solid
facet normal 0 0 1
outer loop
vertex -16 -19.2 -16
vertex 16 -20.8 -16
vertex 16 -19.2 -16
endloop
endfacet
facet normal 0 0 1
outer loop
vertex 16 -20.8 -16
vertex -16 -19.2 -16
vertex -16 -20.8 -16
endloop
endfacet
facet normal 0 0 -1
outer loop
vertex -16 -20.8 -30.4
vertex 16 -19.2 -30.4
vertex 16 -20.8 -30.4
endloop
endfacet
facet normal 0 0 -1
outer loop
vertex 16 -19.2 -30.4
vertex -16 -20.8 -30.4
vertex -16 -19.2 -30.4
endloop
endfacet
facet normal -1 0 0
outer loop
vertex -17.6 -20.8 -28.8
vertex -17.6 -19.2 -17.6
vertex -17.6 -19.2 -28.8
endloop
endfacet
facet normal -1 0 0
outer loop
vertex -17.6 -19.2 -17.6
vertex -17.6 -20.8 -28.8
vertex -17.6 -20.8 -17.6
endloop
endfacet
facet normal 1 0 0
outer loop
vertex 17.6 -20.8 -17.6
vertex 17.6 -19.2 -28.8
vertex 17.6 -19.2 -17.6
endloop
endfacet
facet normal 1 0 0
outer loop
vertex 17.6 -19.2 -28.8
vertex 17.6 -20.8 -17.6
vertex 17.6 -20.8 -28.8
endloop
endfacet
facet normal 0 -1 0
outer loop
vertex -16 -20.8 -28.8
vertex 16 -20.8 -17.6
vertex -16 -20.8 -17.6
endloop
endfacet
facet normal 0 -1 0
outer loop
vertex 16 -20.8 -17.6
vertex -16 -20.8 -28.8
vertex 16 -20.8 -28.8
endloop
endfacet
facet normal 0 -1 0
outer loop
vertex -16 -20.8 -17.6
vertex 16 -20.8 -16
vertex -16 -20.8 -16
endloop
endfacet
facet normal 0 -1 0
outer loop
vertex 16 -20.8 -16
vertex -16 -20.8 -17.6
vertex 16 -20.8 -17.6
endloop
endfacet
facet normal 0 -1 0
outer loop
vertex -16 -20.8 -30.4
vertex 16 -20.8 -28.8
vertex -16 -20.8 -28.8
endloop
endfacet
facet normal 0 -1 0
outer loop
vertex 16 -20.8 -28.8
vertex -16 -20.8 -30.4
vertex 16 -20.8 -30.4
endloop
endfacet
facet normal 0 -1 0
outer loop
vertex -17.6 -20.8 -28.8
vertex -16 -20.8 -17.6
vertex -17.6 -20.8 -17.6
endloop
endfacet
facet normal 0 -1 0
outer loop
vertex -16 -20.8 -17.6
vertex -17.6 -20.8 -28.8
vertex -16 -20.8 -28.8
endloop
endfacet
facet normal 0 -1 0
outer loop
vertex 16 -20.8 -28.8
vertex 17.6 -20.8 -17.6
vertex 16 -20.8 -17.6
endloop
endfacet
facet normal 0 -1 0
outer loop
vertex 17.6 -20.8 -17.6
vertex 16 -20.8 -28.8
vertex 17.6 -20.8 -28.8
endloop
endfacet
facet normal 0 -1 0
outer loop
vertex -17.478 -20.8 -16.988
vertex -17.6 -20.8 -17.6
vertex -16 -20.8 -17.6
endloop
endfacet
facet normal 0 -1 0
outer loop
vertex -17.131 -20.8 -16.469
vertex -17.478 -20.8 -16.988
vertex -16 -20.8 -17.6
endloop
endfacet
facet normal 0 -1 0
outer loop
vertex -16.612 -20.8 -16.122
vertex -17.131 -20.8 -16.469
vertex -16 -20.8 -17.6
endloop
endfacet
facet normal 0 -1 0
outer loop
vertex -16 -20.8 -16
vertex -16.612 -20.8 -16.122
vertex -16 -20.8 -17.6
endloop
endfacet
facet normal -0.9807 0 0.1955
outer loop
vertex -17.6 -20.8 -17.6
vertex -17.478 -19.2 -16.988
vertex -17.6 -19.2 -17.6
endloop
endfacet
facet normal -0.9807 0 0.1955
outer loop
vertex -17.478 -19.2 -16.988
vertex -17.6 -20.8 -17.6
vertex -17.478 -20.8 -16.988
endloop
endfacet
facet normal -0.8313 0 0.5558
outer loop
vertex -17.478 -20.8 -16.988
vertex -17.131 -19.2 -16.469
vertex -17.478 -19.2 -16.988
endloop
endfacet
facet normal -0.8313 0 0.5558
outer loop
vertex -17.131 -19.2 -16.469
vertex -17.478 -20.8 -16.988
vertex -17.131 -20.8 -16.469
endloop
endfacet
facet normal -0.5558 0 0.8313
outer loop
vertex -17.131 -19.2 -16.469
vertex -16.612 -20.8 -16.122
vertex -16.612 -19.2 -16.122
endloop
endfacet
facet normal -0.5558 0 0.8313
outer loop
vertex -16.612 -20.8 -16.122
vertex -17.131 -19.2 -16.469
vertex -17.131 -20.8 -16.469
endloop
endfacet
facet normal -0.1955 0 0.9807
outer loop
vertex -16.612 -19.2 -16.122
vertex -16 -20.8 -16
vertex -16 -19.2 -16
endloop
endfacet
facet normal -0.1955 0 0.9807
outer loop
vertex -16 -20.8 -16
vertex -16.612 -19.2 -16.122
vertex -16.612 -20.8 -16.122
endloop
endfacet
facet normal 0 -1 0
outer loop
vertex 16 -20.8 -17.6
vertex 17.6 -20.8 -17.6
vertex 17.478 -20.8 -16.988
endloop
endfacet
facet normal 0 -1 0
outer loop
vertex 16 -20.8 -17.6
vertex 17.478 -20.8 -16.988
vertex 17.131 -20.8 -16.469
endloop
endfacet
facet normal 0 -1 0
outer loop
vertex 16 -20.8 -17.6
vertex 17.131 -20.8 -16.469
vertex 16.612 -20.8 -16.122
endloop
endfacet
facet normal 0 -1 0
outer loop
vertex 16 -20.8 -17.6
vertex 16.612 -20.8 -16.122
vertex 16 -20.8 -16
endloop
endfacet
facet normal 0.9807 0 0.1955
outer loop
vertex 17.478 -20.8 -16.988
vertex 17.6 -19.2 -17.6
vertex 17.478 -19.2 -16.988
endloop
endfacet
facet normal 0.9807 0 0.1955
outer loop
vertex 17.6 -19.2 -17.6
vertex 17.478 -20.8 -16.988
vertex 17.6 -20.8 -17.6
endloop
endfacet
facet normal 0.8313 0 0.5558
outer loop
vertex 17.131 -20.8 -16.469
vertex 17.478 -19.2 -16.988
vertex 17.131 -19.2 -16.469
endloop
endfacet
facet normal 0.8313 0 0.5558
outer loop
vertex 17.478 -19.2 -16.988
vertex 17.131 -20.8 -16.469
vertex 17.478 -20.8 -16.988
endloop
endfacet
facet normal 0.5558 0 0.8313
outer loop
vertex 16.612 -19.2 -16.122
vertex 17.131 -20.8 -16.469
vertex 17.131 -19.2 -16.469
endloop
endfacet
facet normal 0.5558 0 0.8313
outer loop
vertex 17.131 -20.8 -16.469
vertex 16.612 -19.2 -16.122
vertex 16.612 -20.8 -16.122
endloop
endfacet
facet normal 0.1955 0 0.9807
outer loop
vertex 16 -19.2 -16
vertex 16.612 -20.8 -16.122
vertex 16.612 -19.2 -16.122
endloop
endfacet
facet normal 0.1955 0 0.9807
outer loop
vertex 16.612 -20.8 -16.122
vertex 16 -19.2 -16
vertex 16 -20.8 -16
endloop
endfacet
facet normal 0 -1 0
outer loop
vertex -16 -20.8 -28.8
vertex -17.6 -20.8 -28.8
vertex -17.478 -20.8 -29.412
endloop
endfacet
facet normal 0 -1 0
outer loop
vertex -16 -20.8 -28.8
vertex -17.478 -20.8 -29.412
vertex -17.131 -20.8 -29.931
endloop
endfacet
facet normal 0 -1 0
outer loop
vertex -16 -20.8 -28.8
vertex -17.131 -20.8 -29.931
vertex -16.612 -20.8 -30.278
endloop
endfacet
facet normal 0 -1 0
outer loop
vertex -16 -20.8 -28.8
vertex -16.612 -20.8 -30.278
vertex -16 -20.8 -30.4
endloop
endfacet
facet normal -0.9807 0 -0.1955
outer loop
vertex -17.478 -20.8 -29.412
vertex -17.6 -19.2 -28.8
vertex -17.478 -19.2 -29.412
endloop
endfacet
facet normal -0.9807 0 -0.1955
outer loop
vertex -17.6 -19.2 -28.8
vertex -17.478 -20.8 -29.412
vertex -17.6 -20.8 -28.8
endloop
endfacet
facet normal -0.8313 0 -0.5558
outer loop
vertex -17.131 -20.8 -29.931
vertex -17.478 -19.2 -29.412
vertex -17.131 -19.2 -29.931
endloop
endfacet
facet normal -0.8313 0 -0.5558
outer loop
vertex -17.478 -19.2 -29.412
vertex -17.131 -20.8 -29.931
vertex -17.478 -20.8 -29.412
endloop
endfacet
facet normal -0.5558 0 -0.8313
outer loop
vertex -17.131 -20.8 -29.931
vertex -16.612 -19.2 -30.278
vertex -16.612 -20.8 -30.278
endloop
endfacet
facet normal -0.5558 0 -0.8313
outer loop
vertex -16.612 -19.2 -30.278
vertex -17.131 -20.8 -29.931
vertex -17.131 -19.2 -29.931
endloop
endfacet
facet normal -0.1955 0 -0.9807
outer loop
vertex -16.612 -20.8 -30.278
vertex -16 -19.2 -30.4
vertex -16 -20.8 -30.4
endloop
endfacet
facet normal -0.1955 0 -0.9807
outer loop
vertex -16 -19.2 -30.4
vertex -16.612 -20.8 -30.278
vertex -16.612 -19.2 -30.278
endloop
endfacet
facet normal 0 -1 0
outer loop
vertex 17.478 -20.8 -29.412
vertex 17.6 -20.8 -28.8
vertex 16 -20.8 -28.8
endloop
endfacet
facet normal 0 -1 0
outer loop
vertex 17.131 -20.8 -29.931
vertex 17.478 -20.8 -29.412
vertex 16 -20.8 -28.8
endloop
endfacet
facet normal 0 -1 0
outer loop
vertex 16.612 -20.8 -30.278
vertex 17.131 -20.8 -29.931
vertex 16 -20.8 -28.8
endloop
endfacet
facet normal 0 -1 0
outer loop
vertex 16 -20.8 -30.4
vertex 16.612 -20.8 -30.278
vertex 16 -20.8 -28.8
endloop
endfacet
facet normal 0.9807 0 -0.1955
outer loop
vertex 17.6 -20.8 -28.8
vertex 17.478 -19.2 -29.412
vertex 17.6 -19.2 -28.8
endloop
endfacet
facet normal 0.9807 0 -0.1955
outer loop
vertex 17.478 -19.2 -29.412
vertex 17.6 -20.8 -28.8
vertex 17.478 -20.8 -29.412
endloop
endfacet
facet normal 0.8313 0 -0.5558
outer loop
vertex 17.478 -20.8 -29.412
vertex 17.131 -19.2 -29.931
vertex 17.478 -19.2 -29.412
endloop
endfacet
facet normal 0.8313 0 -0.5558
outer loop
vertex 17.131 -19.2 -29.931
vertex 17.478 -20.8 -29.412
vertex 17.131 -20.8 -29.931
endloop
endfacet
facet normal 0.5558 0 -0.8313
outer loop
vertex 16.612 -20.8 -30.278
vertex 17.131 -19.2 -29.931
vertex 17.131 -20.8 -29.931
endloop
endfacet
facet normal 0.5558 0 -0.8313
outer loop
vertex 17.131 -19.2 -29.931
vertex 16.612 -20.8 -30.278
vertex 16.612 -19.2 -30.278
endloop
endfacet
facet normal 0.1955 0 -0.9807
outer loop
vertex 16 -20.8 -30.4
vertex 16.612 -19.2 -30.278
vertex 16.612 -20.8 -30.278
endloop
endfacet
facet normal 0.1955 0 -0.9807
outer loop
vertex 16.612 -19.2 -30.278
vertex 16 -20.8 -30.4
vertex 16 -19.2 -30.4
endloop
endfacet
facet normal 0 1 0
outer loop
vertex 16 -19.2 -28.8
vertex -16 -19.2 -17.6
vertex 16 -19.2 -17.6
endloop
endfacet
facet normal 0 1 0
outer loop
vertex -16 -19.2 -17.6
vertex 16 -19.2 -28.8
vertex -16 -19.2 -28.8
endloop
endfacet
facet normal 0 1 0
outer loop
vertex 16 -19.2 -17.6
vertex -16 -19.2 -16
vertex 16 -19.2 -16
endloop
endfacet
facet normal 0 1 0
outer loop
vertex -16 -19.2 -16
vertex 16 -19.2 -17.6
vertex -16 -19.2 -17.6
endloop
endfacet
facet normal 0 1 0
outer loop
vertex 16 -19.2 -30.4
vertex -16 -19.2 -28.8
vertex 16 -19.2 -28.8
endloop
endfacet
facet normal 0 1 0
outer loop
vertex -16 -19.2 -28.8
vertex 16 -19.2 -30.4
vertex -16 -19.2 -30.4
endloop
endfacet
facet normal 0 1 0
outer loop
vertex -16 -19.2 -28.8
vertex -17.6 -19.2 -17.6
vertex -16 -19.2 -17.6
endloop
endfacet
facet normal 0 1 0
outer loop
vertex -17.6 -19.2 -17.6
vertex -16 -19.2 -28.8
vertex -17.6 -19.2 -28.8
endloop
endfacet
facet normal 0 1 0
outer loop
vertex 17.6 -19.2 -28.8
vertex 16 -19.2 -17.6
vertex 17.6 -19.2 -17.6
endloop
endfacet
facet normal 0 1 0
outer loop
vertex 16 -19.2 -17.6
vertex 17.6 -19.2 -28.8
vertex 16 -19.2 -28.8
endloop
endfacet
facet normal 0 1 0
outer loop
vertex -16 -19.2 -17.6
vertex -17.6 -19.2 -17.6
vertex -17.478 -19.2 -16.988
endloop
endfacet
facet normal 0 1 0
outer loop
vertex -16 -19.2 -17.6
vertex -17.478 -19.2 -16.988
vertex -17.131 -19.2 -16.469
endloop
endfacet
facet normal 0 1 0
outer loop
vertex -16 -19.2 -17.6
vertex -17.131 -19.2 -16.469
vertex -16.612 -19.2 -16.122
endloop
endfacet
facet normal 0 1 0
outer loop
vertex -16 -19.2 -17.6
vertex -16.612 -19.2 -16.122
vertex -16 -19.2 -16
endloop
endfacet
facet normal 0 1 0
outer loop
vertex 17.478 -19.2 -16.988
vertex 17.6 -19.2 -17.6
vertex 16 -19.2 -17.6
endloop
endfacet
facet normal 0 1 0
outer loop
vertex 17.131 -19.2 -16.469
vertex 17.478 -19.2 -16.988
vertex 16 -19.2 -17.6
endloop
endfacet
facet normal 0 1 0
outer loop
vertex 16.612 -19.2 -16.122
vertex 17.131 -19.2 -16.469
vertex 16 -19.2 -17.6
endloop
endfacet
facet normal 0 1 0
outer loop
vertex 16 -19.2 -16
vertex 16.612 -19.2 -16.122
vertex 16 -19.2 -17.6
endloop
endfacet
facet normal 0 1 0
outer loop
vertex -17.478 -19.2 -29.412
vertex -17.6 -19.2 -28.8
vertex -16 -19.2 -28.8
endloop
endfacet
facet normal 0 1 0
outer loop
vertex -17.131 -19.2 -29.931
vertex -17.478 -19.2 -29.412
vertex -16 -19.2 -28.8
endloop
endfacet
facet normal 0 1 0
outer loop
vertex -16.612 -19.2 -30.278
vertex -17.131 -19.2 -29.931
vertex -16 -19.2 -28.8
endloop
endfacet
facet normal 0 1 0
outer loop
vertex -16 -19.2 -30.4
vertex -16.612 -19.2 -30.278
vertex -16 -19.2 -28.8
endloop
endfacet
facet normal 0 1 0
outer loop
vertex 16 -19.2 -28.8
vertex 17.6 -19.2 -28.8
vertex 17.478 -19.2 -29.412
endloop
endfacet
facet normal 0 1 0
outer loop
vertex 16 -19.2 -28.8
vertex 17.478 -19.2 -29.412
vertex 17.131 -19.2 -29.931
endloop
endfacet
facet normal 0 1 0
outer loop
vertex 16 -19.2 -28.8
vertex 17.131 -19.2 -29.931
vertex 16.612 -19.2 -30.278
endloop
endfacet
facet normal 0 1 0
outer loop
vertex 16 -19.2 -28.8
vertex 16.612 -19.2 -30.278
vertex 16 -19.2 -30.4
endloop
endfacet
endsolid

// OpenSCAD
// file: ../p/1-4edge.scad
use <../lib.scad>
function ldraw_lib__1_4edge() = [
// 0 Circle 0.25
// 0 Name: 1-4edge.dat
// 0 Author: James Jessiman
// 0 !LDRAW_ORG Primitive UPDATE 2017-01
// 0 !LICENSE Licensed under CC BY 2.0 and CC BY 4.0 : see CAreadme.txt
// 
// 0 BFC CERTIFY CCW
  [0,"BFC","CERTIFY"],
  [0,"BFC","CCW"],
// 
// 0 !HISTORY 2007-06-22 [PTadmin] Header formatted for Contributor Agreement
// 0 !HISTORY 2008-07-01 [PTadmin] Official Update 2008-01
// 0 !HISTORY 2017-01-15 [Steffen] BFCed
// 0 !HISTORY 2017-12-30 [PTadmin] Official Update 2017-01
// 
// 
// 2 24 1 0 0 0.9239 0 0.3827
  [2,24,1,0,0,0.9239,0,0.3827],
// 2 24 0.9239 0 0.3827 0.7071 0 0.7071
  [2,24,0.9239,0,0.3827,0.7071,0,0.7071],
// 2 24 0.7071 0 0.7071 0.3827 0 0.9239
  [2,24,0.7071,0,0.7071,0.3827,0,0.9239],
// 2 24 0.3827 0 0.9239 0 0 1
  [2,24,0.3827,0,0.9239,0,0,1],
];
module ldraw_lib__1_4edge(step=0, col=false, unit=2/5, alt=false, line=0.2, solid=!$preview)
    makepoly(ldraw_lib__1_4edge(), step=step, col=col, unit=unit, alt=alt, line=line, solid=solid);
ldraw_lib__1_4edge(line=0.2);
// file: ../p/1-4cyli.scad
use <../lib.scad>
function ldraw_lib__1_4cyli() = [
// 0 Cylinder 0.25
// 0 Name: 1-4cyli.dat
// 0 Author: James Jessiman
// 0 !LDRAW_ORG Primitive UPDATE 2012-01
// 0 !LICENSE Licensed under CC BY 2.0 and CC BY 4.0 : see CAreadme.txt
// 
// 0 BFC CERTIFY CCW
  [0,"BFC","CERTIFY"],
  [0,"BFC","CCW"],
// 
// 0 !HISTORY 2002-03-23 [sbliss] Added BFC statement.
// 0 !HISTORY 2002-04-25 [PTadmin] Official Update 2002-02
// 0 !HISTORY 2007-06-22 [PTadmin] Header formatted for Contributor Agreement
// 0 !HISTORY 2008-07-01 [PTadmin] Official Update 2008-01
// 0 !HISTORY 2012-02-16 [Philo] Changed to CCW
// 0 !HISTORY 2012-03-30 [PTadmin] Official Update 2012-01
// 
// 
// 4 16 1 1 0 0.9239 1 0.3827 0.9239 0 0.3827 1 0 0
  [4,16,1,1,0,0.9239,1,0.3827,0.9239,0,0.3827,1,0,0],
// 5 24 1 0 0 1 1 0 0.9239 0 0.3827 1 0 -1
  [5,24,1,0,0,1,1,0,0.9239,0,0.3827,1,0,-1],
// 4 16 0.9239 1 0.3827 0.7071 1 0.7071 0.7071 0 0.7071 0.9239 0 0.3827
  [4,16,0.9239,1,0.3827,0.7071,1,0.7071,0.7071,0,0.7071,0.9239,0,0.3827],
// 5 24 0.9239 0 0.3827 0.9239 1 0.3827 0.7071 0 0.7071 1 0 0
  [5,24,0.9239,0,0.3827,0.9239,1,0.3827,0.7071,0,0.7071,1,0,0],
// 4 16 0.7071 1 0.7071 0.3827 1 0.9239 0.3827 0 0.9239 0.7071 0 0.7071
  [4,16,0.7071,1,0.7071,0.3827,1,0.9239,0.3827,0,0.9239,0.7071,0,0.7071],
// 5 24 0.7071 0 0.7071 0.7071 1 0.7071 0.3827 0 0.9239 0.9239 0 0.3827
  [5,24,0.7071,0,0.7071,0.7071,1,0.7071,0.3827,0,0.9239,0.9239,0,0.3827],
// 4 16 0.3827 1 0.9239 0 1 1 0 0 1 0.3827 0 0.9239
  [4,16,0.3827,1,0.9239,0,1,1,0,0,1,0.3827,0,0.9239],
// 5 24 0.3827 0 0.9239 0.3827 1 0.9239 0 0 1 0.7071 0 0.7071
  [5,24,0.3827,0,0.9239,0.3827,1,0.9239,0,0,1,0.7071,0,0.7071],
// 5 24 0 0 1 0 1 1 0.3827 0 0.9239 -1 0 1
  [5,24,0,0,1,0,1,1,0.3827,0,0.9239,-1,0,1],
];
module ldraw_lib__1_4cyli(step=0, col=false, unit=2/5, alt=false, line=0.2, solid=!$preview)
    makepoly(ldraw_lib__1_4cyli(), step=step, col=col, unit=unit, alt=alt, line=line, solid=solid);
ldraw_lib__1_4cyli(line=0.2);
// file: ../p/rect2p.scad
use <../lib.scad>
function ldraw_lib__rect2p() = [
// 0 Rectangle with 2 Parallel Edges
// 0 Name: rect2p.dat
// 0 Author: Donald Sutter [technog]
// 0 !LDRAW_ORG Primitive UPDATE 2010-01
// 0 !LICENSE Licensed under CC BY 2.0 and CC BY 4.0 : see CAreadme.txt
// 
// 0 BFC CERTIFY CCW
  [0,"BFC","CERTIFY"],
  [0,"BFC","CCW"],
// 
// 0 !HISTORY 2003-08-01 [PTadmin] Official Update 2003-02
// 0 !HISTORY 2007-06-24 [PTadmin] Header formatted for Contributor Agreement
// 0 !HISTORY 2008-07-01 [PTadmin] Official Update 2008-01
// 0 !HISTORY 2010-01-17 [mikeheide] changed winding to CCW
// 0 !HISTORY 2010-04-05 [PTadmin] Official Update 2010-01
// 
// 
// 2 24 1 0 1 -1 0 1
  [2,24,1,0,1,-1,0,1],
// 2 24 -1 0 -1 1 0 -1
  [2,24,-1,0,-1,1,0,-1],
// 4 16 -1 0 1 -1 0 -1 1 0 -1 1 0 1
  [4,16,-1,0,1,-1,0,-1,1,0,-1,1,0,1],
// 0
];
module ldraw_lib__rect2p(step=0, col=false, unit=2/5, alt=false, line=0.2, solid=!$preview)
    makepoly(ldraw_lib__rect2p(), step=step, col=col, unit=unit, alt=alt, line=line, solid=solid);
ldraw_lib__rect2p(line=0.2);
// file: ../p/1-4disc.scad
use <../lib.scad>
function ldraw_lib__1_4disc() = [
// 0 Disc 0.25
// 0 Name: 1-4disc.dat
// 0 Author: James Jessiman
// 0 !LDRAW_ORG Primitive UPDATE 2002-02
// 0 !LICENSE Licensed under CC BY 2.0 and CC BY 4.0 : see CAreadme.txt
// 
// 0 BFC CERTIFY CCW
  [0,"BFC","CERTIFY"],
  [0,"BFC","CCW"],
// 
// 0 !HISTORY 2002-03-23 [sbliss] Added BFC statement.
// 0 !HISTORY 2002-04-25 [PTadmin] Official Update 2002-02
// 0 !HISTORY 2007-06-22 [PTadmin] Header formatted for Contributor Agreement
// 0 !HISTORY 2008-07-01 [PTadmin] Official Update 2008-01
// 
// 
// 3 16 0 0 0 1 0 0 0.9239 0 0.3827
  [3,16,0,0,0,1,0,0,0.9239,0,0.3827],
// 3 16 0 0 0 0.9239 0 0.3827 0.7071 0 0.7071
  [3,16,0,0,0,0.9239,0,0.3827,0.7071,0,0.7071],
// 3 16 0 0 0 0.7071 0 0.7071 0.3827 0 0.9239
  [3,16,0,0,0,0.7071,0,0.7071,0.3827,0,0.9239],
// 3 16 0 0 0 0.3827 0 0.9239 0 0 1
  [3,16,0,0,0,0.3827,0,0.9239,0,0,1],
// 0
];
module ldraw_lib__1_4disc(step=0, col=false, unit=2/5, alt=false, line=0.2, solid=!$preview)
    makepoly(ldraw_lib__1_4disc(), step=step, col=col, unit=unit, alt=alt, line=line, solid=solid);
ldraw_lib__1_4disc(line=0.2);
// file: ../p/1-4cylc.scad
use <../lib.scad>
use <1-4cyli.scad>
use <1-4disc.scad>
use <1-4edge.scad>
function ldraw_lib__1_4cylc() = [
// 0 Cylinder Closed 0.25
// 0 Name: 1-4cylc.dat
// 0 Author: Mark Kennedy [mkennedy]
// 0 !LDRAW_ORG Primitive UPDATE 2010-01
// 0 !LICENSE Licensed under CC BY 2.0 and CC BY 4.0 : see CAreadme.txt
// 
// 0 BFC CERTIFY CCW
  [0,"BFC","CERTIFY"],
  [0,"BFC","CCW"],
// 
// 0 !HISTORY 2010-04-05 [PTadmin] Official Update 2010-01
// 
// 
// 1 16 0 0 0 1 0 0 0 1 0 0 0 1 1-4edge.dat
  [1,16,0,0,0,1,0,0,0,1,0,0,0,1, ldraw_lib__1_4edge()],
// 1 16 0 1 0 1 0 0 0 1 0 0 0 1 1-4edge.dat
  [1,16,0,1,0,1,0,0,0,1,0,0,0,1, ldraw_lib__1_4edge()],
// 1 16 0 0 0 1 0 0 0 1 0 0 0 1 1-4disc.dat
  [1,16,0,0,0,1,0,0,0,1,0,0,0,1, ldraw_lib__1_4disc()],
// 1 16 0 0 0 1 0 0 0 1 0 0 0 1 1-4cyli.dat
  [1,16,0,0,0,1,0,0,0,1,0,0,0,1, ldraw_lib__1_4cyli()],
// 0
];
module ldraw_lib__1_4cylc(step=0, col=false, unit=2/5, alt=false, line=0.2, solid=!$preview)
    makepoly(ldraw_lib__1_4cylc(), step=step, col=col, unit=unit, alt=alt, line=line, solid=solid);
ldraw_lib__1_4cylc(line=0.2);
// file: 30321.scad
use <../lib.scad>
use <../p/1-4cylc.scad>
use <../p/1-4disc.scad>
use <../p/rect2p.scad>
function ldraw_lib__30321() = [
// 0 Glass for Panel  3 x  6 x  6 with Window
// 0 Name: 30321.dat
// 0 Author: Tony Hafner [hafhead]
// 0 !LDRAW_ORG Part UPDATE 2013-01
// 0 !LICENSE Licensed under CC BY 2.0 and CC BY 4.0 : see CAreadme.txt
// 
// 0 BFC CERTIFY CW
  [0,"BFC","CERTIFY"],
  [0,"BFC","CW"],
// 
// 0 !HISTORY 2003-08-01 [PTadmin] Official Update 2003-02
// 0 !HISTORY 2007-06-25 [PTadmin] Header formatted for Contributor Agreement
// 0 !HISTORY 2008-07-01 [PTadmin] Official Update 2008-01
// 0 !HISTORY 2010-10-18 [Philo] Used more primitives
// 0 !HISTORY 2010-10-18 [PTadmin] Renamed from 354
// 0 !HISTORY 2013-03-22 [mikeheide] shifted origin z=50 and y=-40
// 0 !HISTORY 2013-07-21 [PTadmin] Official Update 2013-01
// 
// 
// 1 16 0 0 0 40 0 0 0 1 0 0 0 -2 rect2p.dat
  [1,16,0,0,0,40,0,0,0,1,0,0,0,-2, ldraw_lib__rect2p()],
// 1 16 0 36 0 40 0 0 0 -1 0 0 0 2 rect2p.dat
  [1,16,0,36,0,40,0,0,0,-1,0,0,0,2, ldraw_lib__rect2p()],
// 1 16 -44 18 0 0 1 0 14 0 0 0 0 2 rect2p.dat
  [1,16,-44,18,0,0,1,0,14,0,0,0,0,2, ldraw_lib__rect2p()],
// 1 16 44 18 0 0 -1 0 14 0 0 0 0 -2 rect2p.dat
  [1,16,44,18,0,0,-1,0,14,0,0,0,0,-2, ldraw_lib__rect2p()],
// 4 16 -40 4 -2 40 4 -2 40 32 -2 -40 32 -2
  [4,16,-40,4,-2,40,4,-2,40,32,-2,-40,32,-2],
// 4 16 -40 0 -2 40 0 -2 40 4 -2 -40 4 -2
  [4,16,-40,0,-2,40,0,-2,40,4,-2,-40,4,-2],
// 4 16 -40 32 -2 40 32 -2 40 36 -2 -40 36 -2
  [4,16,-40,32,-2,40,32,-2,40,36,-2,-40,36,-2],
// 4 16 -44 4 -2 -40 4 -2 -40 32 -2 -44 32 -2
  [4,16,-44,4,-2,-40,4,-2,-40,32,-2,-44,32,-2],
// 4 16 44 4 -2 44 32 -2 40 32 -2 40 4 -2
  [4,16,44,4,-2,44,32,-2,40,32,-2,40,4,-2],
// 1 16 -40 4 -2 -4 0 0 0 0 -4 0 4 0 1-4cylc.dat
  [1,16,-40,4,-2,-4,0,0,0,0,-4,0,4,0, ldraw_lib__1_4cylc()],
// 1 16 40 4 -2 4 0 0 0 0 -4 0 4 0 1-4cylc.dat
  [1,16,40,4,-2,4,0,0,0,0,-4,0,4,0, ldraw_lib__1_4cylc()],
// 1 16 -40 32 -2 -4 0 0 0 0 4 0 4 0 1-4cylc.dat
  [1,16,-40,32,-2,-4,0,0,0,0,4,0,4,0, ldraw_lib__1_4cylc()],
// 1 16 40 32 -2 4 0 0 0 0 4 0 4 0 1-4cylc.dat
  [1,16,40,32,-2,4,0,0,0,0,4,0,4,0, ldraw_lib__1_4cylc()],
// 4 16 -40 4 2 -40 32 2 40 32 2 40 4 2
  [4,16,-40,4,2,-40,32,2,40,32,2,40,4,2],
// 4 16 -40 0 2 -40 4 2 40 4 2 40 0 2
  [4,16,-40,0,2,-40,4,2,40,4,2,40,0,2],
// 4 16 -40 32 2 -40 36 2 40 36 2 40 32 2
  [4,16,-40,32,2,-40,36,2,40,36,2,40,32,2],
// 4 16 -44 4 2 -44 32 2 -40 32 2 -40 4 2
  [4,16,-44,4,2,-44,32,2,-40,32,2,-40,4,2],
// 4 16 44 4 2 40 4 2 40 32 2 44 32 2
  [4,16,44,4,2,40,4,2,40,32,2,44,32,2],
// 1 16 -40 4 2 -4 0 0 0 0 -4 0 -1 0 1-4disc.dat
  [1,16,-40,4,2,-4,0,0,0,0,-4,0,-1,0, ldraw_lib__1_4disc()],
// 1 16 40 4 2 4 0 0 0 0 -4 0 -1 0 1-4disc.dat
  [1,16,40,4,2,4,0,0,0,0,-4,0,-1,0, ldraw_lib__1_4disc()],
// 1 16 -40 32 2 -4 0 0 0 0 4 0 -1 0 1-4disc.dat
  [1,16,-40,32,2,-4,0,0,0,0,4,0,-1,0, ldraw_lib__1_4disc()],
// 1 16 40 32 2 4 0 0 0 0 4 0 -1 0 1-4disc.dat
  [1,16,40,32,2,4,0,0,0,0,4,0,-1,0, ldraw_lib__1_4disc()],
];
module ldraw_lib__30321(step=0, col=false, unit=2/5, alt=false, line=0.2, solid=!$preview)
    makepoly(ldraw_lib__30321(), step=step, col=col, unit=unit, alt=alt, line=line, solid=solid);
ldraw_lib__30321(line=0.2);
// main file
use <../lib.scad>
use <30321.scad>
function ldraw_lib__354() = [
// 0 ~Moved to 30321
// 0 Name: 354.dat
// 0 Author: [PTadmin]
// 0 !LDRAW_ORG Part UPDATE 2013-01
// 0 !LICENSE Licensed under CC BY 4.0 : see CAreadme.txt
// 
// 0 BFC CERTIFY CCW
  [0,"BFC","CERTIFY"],
  [0,"BFC","CCW"],
// 
// 0 !HISTORY 2013-07-21 [PTadmin] Official Update 2013-01
// 
// 
// 0 // Glass for Panel 3 x 6 x 6 with Window
// 
// 1 16 0 40 -50 1 0 0 0 1 0 0 0 1 30321.dat
  [1,16,0,40,-50,1,0,0,0,1,0,0,0,1, ldraw_lib__30321()],
];
module ldraw_lib__354(step=0, col=false, unit=2/5, alt=false, line=0.2, solid=!$preview)
    makepoly(ldraw_lib__354(), step=step, col=col, unit=unit, alt=alt, line=line, solid=solid);
ldraw_lib__354(line=0.2);
